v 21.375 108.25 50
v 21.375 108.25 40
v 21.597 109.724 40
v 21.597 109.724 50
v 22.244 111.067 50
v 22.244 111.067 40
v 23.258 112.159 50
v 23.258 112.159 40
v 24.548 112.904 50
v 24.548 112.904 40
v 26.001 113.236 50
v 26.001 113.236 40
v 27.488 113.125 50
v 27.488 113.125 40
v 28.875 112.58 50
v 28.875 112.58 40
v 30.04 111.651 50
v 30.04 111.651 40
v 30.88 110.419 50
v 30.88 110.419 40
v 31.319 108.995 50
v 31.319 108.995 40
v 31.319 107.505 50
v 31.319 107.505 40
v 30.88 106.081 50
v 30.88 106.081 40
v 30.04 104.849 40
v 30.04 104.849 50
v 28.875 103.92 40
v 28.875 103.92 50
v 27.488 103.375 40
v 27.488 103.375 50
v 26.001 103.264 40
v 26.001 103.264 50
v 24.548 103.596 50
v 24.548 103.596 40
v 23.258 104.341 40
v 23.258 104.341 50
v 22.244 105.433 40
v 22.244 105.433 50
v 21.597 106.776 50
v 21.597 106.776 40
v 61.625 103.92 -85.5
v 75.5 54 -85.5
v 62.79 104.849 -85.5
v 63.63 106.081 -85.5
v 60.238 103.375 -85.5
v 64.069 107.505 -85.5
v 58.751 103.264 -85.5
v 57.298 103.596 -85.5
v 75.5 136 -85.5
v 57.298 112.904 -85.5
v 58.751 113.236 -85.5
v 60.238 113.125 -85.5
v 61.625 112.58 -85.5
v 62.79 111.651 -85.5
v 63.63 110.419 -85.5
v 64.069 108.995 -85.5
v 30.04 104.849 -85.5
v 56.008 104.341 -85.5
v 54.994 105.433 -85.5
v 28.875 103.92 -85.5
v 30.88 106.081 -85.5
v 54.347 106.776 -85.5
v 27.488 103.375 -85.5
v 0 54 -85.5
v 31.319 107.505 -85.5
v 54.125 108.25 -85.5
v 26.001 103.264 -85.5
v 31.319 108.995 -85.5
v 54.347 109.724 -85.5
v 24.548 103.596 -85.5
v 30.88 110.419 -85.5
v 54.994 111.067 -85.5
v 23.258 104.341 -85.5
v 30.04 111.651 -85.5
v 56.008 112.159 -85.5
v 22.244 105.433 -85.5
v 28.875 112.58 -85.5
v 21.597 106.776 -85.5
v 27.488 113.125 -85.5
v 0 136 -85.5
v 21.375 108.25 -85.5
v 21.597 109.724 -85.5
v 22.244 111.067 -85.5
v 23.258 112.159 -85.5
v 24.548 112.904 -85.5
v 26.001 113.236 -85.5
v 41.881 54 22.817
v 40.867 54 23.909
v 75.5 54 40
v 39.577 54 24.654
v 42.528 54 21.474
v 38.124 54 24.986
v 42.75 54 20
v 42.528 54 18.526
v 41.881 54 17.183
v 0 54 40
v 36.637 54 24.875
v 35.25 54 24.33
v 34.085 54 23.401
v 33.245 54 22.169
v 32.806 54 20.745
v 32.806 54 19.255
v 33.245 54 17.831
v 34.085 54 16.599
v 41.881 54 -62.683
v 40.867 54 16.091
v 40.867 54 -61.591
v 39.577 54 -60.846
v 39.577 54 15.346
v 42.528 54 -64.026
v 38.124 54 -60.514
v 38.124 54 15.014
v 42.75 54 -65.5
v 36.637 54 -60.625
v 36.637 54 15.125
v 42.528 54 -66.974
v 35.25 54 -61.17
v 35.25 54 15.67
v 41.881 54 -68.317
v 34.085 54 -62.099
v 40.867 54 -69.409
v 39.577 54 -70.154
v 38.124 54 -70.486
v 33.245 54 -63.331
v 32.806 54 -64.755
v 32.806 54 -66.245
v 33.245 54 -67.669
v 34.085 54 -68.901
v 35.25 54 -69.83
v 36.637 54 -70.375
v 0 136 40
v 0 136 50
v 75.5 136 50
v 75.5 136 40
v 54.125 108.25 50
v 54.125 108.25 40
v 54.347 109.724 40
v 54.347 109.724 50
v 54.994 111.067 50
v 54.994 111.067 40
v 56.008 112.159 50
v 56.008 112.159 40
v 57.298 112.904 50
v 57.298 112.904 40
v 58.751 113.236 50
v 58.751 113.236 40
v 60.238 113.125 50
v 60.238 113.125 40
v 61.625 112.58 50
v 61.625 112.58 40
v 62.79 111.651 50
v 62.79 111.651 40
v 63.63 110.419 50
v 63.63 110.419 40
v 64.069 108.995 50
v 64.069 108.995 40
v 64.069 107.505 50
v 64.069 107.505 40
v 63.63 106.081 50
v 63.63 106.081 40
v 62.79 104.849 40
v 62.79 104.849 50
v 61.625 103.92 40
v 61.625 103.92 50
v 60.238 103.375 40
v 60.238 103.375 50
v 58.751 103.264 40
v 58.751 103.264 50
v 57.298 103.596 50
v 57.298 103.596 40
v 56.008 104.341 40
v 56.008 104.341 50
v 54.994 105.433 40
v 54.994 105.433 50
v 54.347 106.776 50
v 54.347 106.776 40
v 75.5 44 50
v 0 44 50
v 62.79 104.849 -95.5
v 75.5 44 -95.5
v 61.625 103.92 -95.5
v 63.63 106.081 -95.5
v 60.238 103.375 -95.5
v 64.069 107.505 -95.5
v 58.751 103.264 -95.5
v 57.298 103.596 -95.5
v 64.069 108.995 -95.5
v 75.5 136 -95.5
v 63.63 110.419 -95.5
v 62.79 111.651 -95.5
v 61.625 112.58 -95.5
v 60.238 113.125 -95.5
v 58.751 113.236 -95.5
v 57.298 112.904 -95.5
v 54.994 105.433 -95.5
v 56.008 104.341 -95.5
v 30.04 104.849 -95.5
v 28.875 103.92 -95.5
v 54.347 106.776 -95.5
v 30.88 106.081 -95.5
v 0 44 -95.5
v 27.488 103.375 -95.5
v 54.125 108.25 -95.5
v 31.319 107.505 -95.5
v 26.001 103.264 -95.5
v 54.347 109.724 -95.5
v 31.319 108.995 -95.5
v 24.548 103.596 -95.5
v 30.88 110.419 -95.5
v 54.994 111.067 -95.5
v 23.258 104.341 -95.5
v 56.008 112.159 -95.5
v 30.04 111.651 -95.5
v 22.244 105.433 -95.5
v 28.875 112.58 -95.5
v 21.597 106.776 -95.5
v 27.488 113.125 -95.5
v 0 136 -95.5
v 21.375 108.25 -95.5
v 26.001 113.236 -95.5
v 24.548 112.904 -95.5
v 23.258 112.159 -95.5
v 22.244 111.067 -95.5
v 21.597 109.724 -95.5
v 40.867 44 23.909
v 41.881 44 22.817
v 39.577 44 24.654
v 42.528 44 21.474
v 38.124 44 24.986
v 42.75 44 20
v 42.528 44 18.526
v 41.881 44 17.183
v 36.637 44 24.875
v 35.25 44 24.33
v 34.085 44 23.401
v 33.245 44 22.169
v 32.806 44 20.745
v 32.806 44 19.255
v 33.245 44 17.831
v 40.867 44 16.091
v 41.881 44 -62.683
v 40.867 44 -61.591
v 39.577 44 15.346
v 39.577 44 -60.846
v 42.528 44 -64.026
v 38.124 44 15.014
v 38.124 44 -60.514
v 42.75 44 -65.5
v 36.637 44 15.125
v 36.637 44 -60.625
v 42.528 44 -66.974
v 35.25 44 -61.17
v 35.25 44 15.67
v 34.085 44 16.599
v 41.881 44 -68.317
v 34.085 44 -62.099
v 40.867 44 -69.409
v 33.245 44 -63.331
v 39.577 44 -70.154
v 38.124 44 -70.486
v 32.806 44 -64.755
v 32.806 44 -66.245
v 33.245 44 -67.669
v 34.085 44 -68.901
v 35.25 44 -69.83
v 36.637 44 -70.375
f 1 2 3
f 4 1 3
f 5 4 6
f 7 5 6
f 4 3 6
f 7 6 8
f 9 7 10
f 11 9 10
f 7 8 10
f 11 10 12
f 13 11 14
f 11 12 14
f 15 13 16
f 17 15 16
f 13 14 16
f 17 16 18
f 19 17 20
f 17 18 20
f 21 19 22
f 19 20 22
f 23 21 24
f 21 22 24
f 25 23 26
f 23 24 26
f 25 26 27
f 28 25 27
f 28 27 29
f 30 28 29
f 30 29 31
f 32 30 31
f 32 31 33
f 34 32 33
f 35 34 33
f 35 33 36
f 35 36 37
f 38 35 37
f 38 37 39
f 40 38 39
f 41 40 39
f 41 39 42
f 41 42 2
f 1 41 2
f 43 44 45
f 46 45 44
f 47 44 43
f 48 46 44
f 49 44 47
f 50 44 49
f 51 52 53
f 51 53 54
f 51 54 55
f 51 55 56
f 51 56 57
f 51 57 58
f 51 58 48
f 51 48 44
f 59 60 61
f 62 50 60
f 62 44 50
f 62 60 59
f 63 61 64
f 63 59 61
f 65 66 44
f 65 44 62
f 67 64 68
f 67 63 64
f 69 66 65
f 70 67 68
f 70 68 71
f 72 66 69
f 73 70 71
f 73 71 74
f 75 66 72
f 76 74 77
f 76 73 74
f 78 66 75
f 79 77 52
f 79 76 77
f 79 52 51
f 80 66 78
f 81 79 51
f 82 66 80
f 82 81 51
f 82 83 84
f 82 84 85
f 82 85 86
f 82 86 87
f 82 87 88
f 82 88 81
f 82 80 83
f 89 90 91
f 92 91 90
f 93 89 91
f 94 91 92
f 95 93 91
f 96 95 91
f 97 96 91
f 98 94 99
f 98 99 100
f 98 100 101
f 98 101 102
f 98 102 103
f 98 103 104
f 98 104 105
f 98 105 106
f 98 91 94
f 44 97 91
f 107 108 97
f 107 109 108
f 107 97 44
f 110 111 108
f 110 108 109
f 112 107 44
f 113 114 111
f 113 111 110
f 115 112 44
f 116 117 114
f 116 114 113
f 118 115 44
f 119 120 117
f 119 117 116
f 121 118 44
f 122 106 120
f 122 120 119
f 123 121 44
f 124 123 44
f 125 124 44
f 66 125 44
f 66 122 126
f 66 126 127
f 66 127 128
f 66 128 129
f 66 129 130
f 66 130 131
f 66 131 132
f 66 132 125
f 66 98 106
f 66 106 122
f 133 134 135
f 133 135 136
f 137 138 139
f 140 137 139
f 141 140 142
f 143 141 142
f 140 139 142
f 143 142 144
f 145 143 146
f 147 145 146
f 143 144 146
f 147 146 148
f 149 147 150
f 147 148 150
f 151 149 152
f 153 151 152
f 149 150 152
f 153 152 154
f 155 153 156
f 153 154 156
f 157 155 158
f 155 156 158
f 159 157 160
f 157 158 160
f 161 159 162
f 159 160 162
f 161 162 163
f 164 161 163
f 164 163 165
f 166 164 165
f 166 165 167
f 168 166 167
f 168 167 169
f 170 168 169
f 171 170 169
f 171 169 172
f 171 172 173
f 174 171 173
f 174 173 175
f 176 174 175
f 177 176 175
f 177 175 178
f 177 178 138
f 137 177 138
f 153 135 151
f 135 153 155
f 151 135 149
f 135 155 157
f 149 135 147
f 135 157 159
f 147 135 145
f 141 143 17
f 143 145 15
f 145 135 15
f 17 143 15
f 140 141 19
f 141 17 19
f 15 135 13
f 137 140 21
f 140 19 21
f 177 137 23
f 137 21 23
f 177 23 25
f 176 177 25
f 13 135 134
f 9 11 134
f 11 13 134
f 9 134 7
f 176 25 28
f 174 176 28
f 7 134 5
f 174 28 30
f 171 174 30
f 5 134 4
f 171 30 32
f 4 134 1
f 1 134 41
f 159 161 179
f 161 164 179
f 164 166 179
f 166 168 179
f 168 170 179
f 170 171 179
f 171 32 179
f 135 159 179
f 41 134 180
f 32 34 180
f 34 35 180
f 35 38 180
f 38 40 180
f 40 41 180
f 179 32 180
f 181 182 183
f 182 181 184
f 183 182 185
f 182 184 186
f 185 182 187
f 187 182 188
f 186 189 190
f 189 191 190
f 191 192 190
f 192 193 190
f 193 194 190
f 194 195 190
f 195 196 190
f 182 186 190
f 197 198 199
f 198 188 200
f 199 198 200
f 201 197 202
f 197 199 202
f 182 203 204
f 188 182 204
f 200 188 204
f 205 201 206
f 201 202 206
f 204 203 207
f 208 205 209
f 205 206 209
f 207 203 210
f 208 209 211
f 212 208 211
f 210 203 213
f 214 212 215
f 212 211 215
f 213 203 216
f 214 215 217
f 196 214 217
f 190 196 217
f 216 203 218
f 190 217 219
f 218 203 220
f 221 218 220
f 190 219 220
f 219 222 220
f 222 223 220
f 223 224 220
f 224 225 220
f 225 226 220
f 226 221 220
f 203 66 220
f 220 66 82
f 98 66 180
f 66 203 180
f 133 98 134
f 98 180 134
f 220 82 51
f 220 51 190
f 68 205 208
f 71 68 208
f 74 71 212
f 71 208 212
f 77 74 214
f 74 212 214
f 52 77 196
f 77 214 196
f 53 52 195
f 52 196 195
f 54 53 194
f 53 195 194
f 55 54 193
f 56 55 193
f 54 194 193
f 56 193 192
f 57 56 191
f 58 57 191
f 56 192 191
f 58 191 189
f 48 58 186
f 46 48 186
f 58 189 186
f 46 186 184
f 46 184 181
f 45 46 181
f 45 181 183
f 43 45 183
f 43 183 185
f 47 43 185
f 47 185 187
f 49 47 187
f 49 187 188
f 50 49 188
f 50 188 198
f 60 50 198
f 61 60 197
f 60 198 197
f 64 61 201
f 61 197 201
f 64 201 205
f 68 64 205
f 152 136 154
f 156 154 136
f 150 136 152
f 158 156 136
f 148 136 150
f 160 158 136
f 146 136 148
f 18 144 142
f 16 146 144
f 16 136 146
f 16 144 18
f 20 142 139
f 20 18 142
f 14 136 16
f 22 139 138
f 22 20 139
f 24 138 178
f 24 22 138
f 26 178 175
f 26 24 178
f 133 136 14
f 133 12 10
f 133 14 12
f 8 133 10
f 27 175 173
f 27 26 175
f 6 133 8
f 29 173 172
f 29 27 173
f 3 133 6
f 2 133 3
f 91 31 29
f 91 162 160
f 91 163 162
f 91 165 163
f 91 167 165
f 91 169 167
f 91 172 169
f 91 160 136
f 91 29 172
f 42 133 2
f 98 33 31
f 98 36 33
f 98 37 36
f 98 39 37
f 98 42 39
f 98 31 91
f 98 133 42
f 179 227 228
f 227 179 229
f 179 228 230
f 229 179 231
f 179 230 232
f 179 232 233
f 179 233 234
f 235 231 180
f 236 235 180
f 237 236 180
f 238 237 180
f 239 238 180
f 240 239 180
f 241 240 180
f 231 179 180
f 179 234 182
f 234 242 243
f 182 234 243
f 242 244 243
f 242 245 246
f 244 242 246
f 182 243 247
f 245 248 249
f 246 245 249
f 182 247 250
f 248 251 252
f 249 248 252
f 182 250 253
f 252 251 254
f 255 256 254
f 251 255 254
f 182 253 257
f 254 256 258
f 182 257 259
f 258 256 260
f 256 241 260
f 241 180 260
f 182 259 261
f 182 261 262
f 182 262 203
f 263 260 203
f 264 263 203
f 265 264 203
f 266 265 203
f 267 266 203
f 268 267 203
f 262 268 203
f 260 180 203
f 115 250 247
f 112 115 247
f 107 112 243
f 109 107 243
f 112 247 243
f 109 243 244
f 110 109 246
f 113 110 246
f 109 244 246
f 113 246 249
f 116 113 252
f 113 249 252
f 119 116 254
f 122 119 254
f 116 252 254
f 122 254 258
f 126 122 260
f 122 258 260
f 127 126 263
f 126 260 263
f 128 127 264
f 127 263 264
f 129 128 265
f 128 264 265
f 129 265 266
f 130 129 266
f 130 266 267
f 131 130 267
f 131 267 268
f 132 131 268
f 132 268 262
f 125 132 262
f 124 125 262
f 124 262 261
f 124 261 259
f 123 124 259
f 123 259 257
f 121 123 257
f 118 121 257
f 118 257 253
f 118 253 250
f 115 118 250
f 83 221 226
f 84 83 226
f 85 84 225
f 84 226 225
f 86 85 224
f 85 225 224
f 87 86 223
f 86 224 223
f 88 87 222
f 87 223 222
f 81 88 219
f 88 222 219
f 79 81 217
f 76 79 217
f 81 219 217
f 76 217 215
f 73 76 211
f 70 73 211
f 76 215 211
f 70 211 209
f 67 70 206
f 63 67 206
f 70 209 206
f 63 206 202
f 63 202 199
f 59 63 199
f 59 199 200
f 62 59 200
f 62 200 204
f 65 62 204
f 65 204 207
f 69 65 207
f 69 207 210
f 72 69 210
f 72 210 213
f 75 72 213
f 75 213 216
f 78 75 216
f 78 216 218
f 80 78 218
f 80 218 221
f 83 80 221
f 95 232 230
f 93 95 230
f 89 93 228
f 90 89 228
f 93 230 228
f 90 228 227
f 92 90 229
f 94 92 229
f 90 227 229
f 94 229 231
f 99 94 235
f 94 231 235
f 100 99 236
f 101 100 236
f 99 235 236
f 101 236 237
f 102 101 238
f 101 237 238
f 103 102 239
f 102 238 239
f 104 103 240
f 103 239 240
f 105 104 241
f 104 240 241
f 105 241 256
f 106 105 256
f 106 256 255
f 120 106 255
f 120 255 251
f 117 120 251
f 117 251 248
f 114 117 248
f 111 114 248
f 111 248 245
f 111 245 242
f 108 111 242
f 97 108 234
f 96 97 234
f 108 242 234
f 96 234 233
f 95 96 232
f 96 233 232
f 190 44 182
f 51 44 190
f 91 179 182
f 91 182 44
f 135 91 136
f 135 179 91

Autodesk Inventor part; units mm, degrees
ref_plane "YZ Plane" through (0, 0, 0) normal (1, 0, 0) x (0, 1, 0)
ref_plane "XZ Plane" through (0, 0, 0) normal (0, 1, 0) x (-1, 0, 0)
ref_plane "XY Plane" through (0, 0, 0) normal (0, 0, 1) x (1, 0, 0)
sketch "Sketch1" plane through (0, 0, 0) normal (1, 0, 0) x (0, 1, 0)
  line L0 (-6, -12.5) -> (-6, -12.9)
  arc A0 (-6, -12.9) -> (-5.6, -13.3) centre (-5.6, -12.9) ccw
  line L1 (-5.6, -13.3) -> (-4.9, -13.3)
  arc A1 (-4.9, -13.3) -> (-4.7, -13.1) centre (-4.9, -13.1) ccw
  line L2 (-4.7, -13.1) -> (-4.7, -12.85)
  arc A2 (-4.5, -12.65) -> (-4.7, -12.85) centre (-4.5, -12.85) ccw
  line L3 (-4.5, -12.65) -> (-1.8, -12.65)
  arc A3 (-1.4, -13.05) -> (-1.8, -12.65) centre (-1.8, -13.05) ccw
  line L4 (-1.4, -13.05) -> (-1.4, -18.75)
  line L5 (-1.8, -19.15) -> (-4.5, -19.15)
  arc A4 (-1.8, -19.15) -> (-1.4, -18.75) centre (-1.8, -18.75) ccw
  arc A5 (-4.7, -18.95) -> (-4.5, -19.15) centre (-4.5, -18.95) ccw
  line L6 (-4.7, -18.95) -> (-4.7, -18.7)
  arc A6 (-4.7, -18.7) -> (-4.9, -18.5) centre (-4.9, -18.7) ccw
  line L7 (-4.9, -18.5) -> (-5.6, -18.5)
  arc A7 (-5.6, -18.5) -> (-6, -18.9) centre (-5.6, -18.9) ccw
  line L8 (-6, -18.9) -> (-6, -19.5)
  line L9 (-6.5, -6.5) -> (-6.5, -12.5)
  line L10 (-6.5, -12.5) -> (-2.5, -12.5)
  line L11 (-1.05, -19.5) -> (-6.5, -19.5)
  line L12 (-6.5, -19.5) -> (-6.5, -26)
  line L13 (-6.5, -26) -> (-1.05, -26)
  line L14 (-6, -26) -> (-6, -26.6)
  arc A8 (-6, -26.6) -> (-5.6, -27) centre (-5.6, -26.6) ccw
  line L15 (-5.6, -27) -> (-4.9, -27)
  arc A9 (-4.9, -27) -> (-4.7, -26.8) centre (-4.9, -26.8) ccw
  arc A10 (-4.5, -26.35) -> (-4.7, -26.55) centre (-4.5, -26.55) ccw
  line L16 (-4.7, -26.8) -> (-4.7, -26.55)
  line L17 (-4.5, -26.35) -> (-1.8, -26.35)
  arc A11 (-1.4, -26.75) -> (-1.8, -26.35) centre (-1.8, -26.75) ccw
  line L18 (-1.4, -26.75) -> (-1.4, -32.45)
  arc A12 (-1.8, -32.85) -> (-1.4, -32.45) centre (-1.8, -32.45) ccw
  line L19 (-1.8, -32.85) -> (-4.5, -32.85)
  arc A13 (-4.7, -32.65) -> (-4.5, -32.85) centre (-4.5, -32.65) ccw
  line L20 (-4.7, -32.65) -> (-4.7, -32.4)
  arc A14 (-4.7, -32.4) -> (-4.9, -32.2) centre (-4.9, -32.4) ccw
  line L21 (-4.9, -32.2) -> (-5.6, -32.2)
  arc A15 (-5.6, -32.2) -> (-6, -32.6) centre (-5.6, -32.6) ccw
  line L22 (-6, -32.6) -> (-6, -33)
  line L23 (-2.5, -33) -> (-6.5, -33)
  line L24 (-6.5, -33) -> (-6.5, -39)
  line L25 (32.5, 0) -> (0, 0)
  circle A16 centre (0, -6.5) radius 4.75
  circle A17 centre (32.5, -6.5) radius 4.75
  circle A18 centre (0, -39) radius 4.75
  circle A19 centre (32.5, -39) radius 4.75
  line L26 (39, -26) -> (39, -19.5)
  line L27 (39, -12.5) -> (39, -6.5)
  line L28 (39, -39) -> (39, -33)
  line L29 (26.5, -45.5) -> (32.5, -45.5)
  line L30 (0, -45.5) -> (6, -45.5)
  line L31 (13, -45.5) -> (19.5, -45.5)
  circle A20 centre (16.25, -22.75) radius 15
  circle A21 centre (16.2588, 5.0016) radius 2.5
  circle A22 centre (16.25, -50.5) radius 2.5
  circle A23 centre (16.25, -22.75) radius 5
  circle A24 centre (16.25, -22.75) radius 8.45
  line L32 (24.75, -27.6575) -> (24.75, -17.8425)
  line L33 (44, 10) -> (-11.5, 10)
  line L34 (-11.5, 10) -> (-11.5, -55.5)
  line L35 (-11.5, -55.5) -> (44, -55.5)
  line L36 (44, -55.5) -> (44, 10)
  line L37 (-11.5, 30) -> (44, 30)
  line L38 (-11.5, -75.5) -> (-11.5, 30)
  line L39 (44, 30) -> (44, -75.5)
  line L40 (44, -75.5) -> (-11.5, -75.5)
  circle A25 centre (16.25, -65.5) radius 5
  circle A26 centre (16.25, 20) radius 5
  line L41 (44, 30) -> (44, 50)
  line L42 (44, -75.5) -> (44, -95.5)
  line L43 (110, 50) -> (84, 50)
  line L44 (84, 50) -> (84, -95.5)
  line L45 (84, -95.5) -> (110, -95.5)
  line L46 (110, -95.5) -> (110, 50)
  line L47 (84, 50) -> (104, 50)
  line L48 (104, -95.5) -> (84, -95.5)
  line L49 (84, -95.5) -> (84, 50)
  line L50 (84, 50) -> (64, 50)
  line L51 (64, 50) -> (64, -95.5)
  line L52 (64, -95.5) -> (84, -95.5)
  line L53 (84, -95.5) -> (84, 50)
  line L54 (64, 50) -> (44, 50)
  line L55 (44, 50) -> (44, -95.5)
  line L56 (44, -95.5) -> (64, -95.5)
  line L57 (64, -95.5) -> (64, 50)
  line L58 (44, 30) -> (54, 30)
  line L59 (100.8097, 50) -> (100.8097, 40)
  line L60 (94, -95.5) -> (94, -85.5)
  line L61 (110, 40) -> (54, 40)
  line L62 (54, 40) -> (54, -85.5)
  line L63 (54, -85.5) -> (110, -85.5)
  line L64 (110, 50) -> (136, 50)
  line L65 (136, 50) -> (136, 40)
  line L66 (136, 40) -> (110, 40)
  line L67 (110, -85.5) -> (136, -85.5)
  line L68 (136, -85.5) -> (136, -95.5)
  line L69 (136, -95.5) -> (110, -95.5)
  dimension "d0" = 20
  dimension "d1" = 20
  dimension "d2" = 55.5
  dimension "d3" = 26
  dimension "d5" = 20
  dimension "d6" = 45.5
  dimension "d7" = 20
  dimension "d8" = 10
  dimension "d9" = 10
  dimension "d10" = 26
extrude "Extrusion1" add sketch "Sketch1" along normal blind 75.5 contours L39 L58 L62 L63 L51 L56 L42 L36 | L41 L54 L51 L61 L62 L58 | L50 L44 L61 L51 | L51 L63 L44 L52 | L43 L59 L61 L44 | L44 L63 L60 L45 | L43 L46 L61 L59 | L60 L63 L46 L45 | L64 L65 L66 L46 | L67 L68 L69 L46
sketch "Sketch2" plane through (0, 44, -95.5) normal (0, -1, 0) x (1, 0, 0)
  line L0 (15.5, 83) -> (15.5, 82.6)
  arc A0 (15.5, 82.6) -> (15.9, 82.2) centre (15.9, 82.6) ccw
  line L1 (15.9, 82.2) -> (16.6, 82.2)
  arc A1 (16.6, 82.2) -> (16.8, 82.4) centre (16.6, 82.4) ccw
  line L2 (16.8, 82.4) -> (16.8, 82.65)
  arc A2 (17, 82.85) -> (16.8, 82.65) centre (17, 82.65) ccw
  line L3 (17, 82.85) -> (19.7, 82.85)
  arc A3 (20.1, 82.45) -> (19.7, 82.85) centre (19.7, 82.45) ccw
  line L4 (20.1, 82.45) -> (20.1, 76.75)
  line L5 (19.7, 76.35) -> (17, 76.35)
  arc A4 (19.7, 76.35) -> (20.1, 76.75) centre (19.7, 76.75) ccw
  arc A5 (16.8, 76.55) -> (17, 76.35) centre (17, 76.55) ccw
  line L6 (16.8, 76.55) -> (16.8, 76.8)
  arc A6 (16.8, 76.8) -> (16.6, 77) centre (16.6, 76.8) ccw
  line L7 (16.6, 77) -> (15.9, 77)
  arc A7 (15.9, 77) -> (15.5, 76.6) centre (15.9, 76.6) ccw
  line L8 (15.5, 76.6) -> (15.5, 76)
  line L9 (15, 89) -> (15, 83)
  line L10 (15, 83) -> (19, 83)
  line L11 (20.45, 76) -> (15, 76)
  line L12 (15, 76) -> (15, 69.5)
  line L13 (15, 69.5) -> (20.45, 69.5)
  line L14 (15.5, 69.5) -> (15.5, 68.9)
  arc A8 (15.5, 68.9) -> (15.9, 68.5) centre (15.9, 68.9) ccw
  line L15 (15.9, 68.5) -> (16.6, 68.5)
  arc A9 (16.6, 68.5) -> (16.8, 68.7) centre (16.6, 68.7) ccw
  arc A10 (17, 69.15) -> (16.8, 68.95) centre (17, 68.95) ccw
  line L16 (16.8, 68.7) -> (16.8, 68.95)
  line L17 (17, 69.15) -> (19.7, 69.15)
  arc A11 (20.1, 68.75) -> (19.7, 69.15) centre (19.7, 68.75) ccw
  line L18 (20.1, 68.75) -> (20.1, 63.05)
  arc A12 (19.7, 62.65) -> (20.1, 63.05) centre (19.7, 63.05) ccw
  line L19 (19.7, 62.65) -> (17, 62.65)
  arc A13 (16.8, 62.85) -> (17, 62.65) centre (17, 62.85) ccw
  line L20 (16.8, 62.85) -> (16.8, 63.1)
  arc A14 (16.8, 63.1) -> (16.6, 63.3) centre (16.6, 63.1) ccw
  line L21 (16.6, 63.3) -> (15.9, 63.3)
  arc A15 (15.9, 63.3) -> (15.5, 62.9) centre (15.9, 62.9) ccw
  line L22 (15.5, 62.9) -> (15.5, 62.5)
  line L23 (19, 62.5) -> (15, 62.5)
  line L24 (15, 62.5) -> (15, 56.5)
  line L25 (54, 95.5) -> (21.5, 96.1203)
  circle A16 centre (21.5, 89) radius 4.75
  circle A17 centre (54, 89) radius 4.75
  circle A18 centre (21.5, 56.5) radius 4.75
  circle A19 centre (54, 56.5) radius 4.75
  line L26 (60.5, 69.5) -> (60.5, 76)
  line L27 (60.5, 83) -> (60.5, 89)
  line L28 (60.5, 56.5) -> (60.5, 62.5)
  line L29 (48, 50) -> (54, 50)
  line L30 (21.5, 50) -> (27.5, 50)
  line L31 (34.5, 50) -> (41, 50)
  circle A20 centre (37.75, 72.75) radius 15
  circle A21 centre (37.7588, 100.5016) radius 2.5
  circle A22 centre (37.75, 45) radius 2.5
  circle A23 centre (37.75, 72.75) radius 5
  circle A24 centre (37.75, 72.75) radius 8.45
  line L32 (46.25, 67.8425) -> (46.25, 77.6575)
  line L33 (65.5, 105.5) -> (10, 105.5)
  line L34 (10, 105.5) -> (10, 40)
  line L35 (10, 40) -> (65.5, 40)
  line L36 (65.5, 40) -> (65.5, 105.5)
  line L37 (10, 125.5) -> (65.5, 125.5)
  line L38 (10, 20) -> (10, 125.5)
  line L39 (65.5, 125.5) -> (65.5, 20)
  line L40 (65.5, 20) -> (10, 20)
  circle A25 centre (37.75, 30) radius 5
  circle A26 centre (37.75, 115.5) radius 5
  line L41 (0, 145.5) -> (0, 0) projected
  line L42 (75.5, 145.5) -> (75.5, 0) projected
  line L43 (0, 145.5) -> (75.5, 0)
  line L44 (75.5, 0) -> (75.5, 145.5)
  line L45 (75.5, 145.5) -> (0, 0)
  line L46 (37.75, 72.75) -> (-23.5643, 72.75)
  point P0 (0, 95.5)
extrude "Extrusion2" cut sketch "Sketch2" against normal blind 75.5 contours A25 | A26
sketch "Sketch3" plane through (0, 44, -95.5) normal (0, 0, -1) x (-1, 0, 0)
  line L0 (0, 92) -> (-75.5, 92) projected
  line L1 (-75.5, 92) -> (-10, 92)
  line L2 (-10, 92) -> (-10, 36.5)
  line L3 (-10, 36.5) -> (-75.5, 36.5)
  line L4 (-75.5, 36.5) -> (-75.5, 92)
  line L5 (-42.75, 36.5) -> (-42.75, 92)
  line L6 (-10, 36.5) -> (-42.75, 92)
  line L7 (-26.375, 64.25) -> (-42.75, 64.25)
  line L8 (-42.75, 36.5) -> (-75.5, 92)
  line L9 (-59.125, 64.25) -> (-42.75, 64.25)
  circle A0 centre (-26.375, 64.25) radius 5
  circle A1 centre (-59.125, 64.25) radius 5
  point P0 (0, -44)
  dimension "d21" = 65.5
  dimension "d22" = 55.5
  dimension "d23" = 10
  dimension "d24" = 10
extrude "Extrusion3" cut sketch "Sketch3" against normal through all contours A0 L6 | L6 L7 A0 | A0 L7 L6 | A1 L9 L8 | L8 A1 | A1 L8 L9
properties part number "CarroSuperior"
